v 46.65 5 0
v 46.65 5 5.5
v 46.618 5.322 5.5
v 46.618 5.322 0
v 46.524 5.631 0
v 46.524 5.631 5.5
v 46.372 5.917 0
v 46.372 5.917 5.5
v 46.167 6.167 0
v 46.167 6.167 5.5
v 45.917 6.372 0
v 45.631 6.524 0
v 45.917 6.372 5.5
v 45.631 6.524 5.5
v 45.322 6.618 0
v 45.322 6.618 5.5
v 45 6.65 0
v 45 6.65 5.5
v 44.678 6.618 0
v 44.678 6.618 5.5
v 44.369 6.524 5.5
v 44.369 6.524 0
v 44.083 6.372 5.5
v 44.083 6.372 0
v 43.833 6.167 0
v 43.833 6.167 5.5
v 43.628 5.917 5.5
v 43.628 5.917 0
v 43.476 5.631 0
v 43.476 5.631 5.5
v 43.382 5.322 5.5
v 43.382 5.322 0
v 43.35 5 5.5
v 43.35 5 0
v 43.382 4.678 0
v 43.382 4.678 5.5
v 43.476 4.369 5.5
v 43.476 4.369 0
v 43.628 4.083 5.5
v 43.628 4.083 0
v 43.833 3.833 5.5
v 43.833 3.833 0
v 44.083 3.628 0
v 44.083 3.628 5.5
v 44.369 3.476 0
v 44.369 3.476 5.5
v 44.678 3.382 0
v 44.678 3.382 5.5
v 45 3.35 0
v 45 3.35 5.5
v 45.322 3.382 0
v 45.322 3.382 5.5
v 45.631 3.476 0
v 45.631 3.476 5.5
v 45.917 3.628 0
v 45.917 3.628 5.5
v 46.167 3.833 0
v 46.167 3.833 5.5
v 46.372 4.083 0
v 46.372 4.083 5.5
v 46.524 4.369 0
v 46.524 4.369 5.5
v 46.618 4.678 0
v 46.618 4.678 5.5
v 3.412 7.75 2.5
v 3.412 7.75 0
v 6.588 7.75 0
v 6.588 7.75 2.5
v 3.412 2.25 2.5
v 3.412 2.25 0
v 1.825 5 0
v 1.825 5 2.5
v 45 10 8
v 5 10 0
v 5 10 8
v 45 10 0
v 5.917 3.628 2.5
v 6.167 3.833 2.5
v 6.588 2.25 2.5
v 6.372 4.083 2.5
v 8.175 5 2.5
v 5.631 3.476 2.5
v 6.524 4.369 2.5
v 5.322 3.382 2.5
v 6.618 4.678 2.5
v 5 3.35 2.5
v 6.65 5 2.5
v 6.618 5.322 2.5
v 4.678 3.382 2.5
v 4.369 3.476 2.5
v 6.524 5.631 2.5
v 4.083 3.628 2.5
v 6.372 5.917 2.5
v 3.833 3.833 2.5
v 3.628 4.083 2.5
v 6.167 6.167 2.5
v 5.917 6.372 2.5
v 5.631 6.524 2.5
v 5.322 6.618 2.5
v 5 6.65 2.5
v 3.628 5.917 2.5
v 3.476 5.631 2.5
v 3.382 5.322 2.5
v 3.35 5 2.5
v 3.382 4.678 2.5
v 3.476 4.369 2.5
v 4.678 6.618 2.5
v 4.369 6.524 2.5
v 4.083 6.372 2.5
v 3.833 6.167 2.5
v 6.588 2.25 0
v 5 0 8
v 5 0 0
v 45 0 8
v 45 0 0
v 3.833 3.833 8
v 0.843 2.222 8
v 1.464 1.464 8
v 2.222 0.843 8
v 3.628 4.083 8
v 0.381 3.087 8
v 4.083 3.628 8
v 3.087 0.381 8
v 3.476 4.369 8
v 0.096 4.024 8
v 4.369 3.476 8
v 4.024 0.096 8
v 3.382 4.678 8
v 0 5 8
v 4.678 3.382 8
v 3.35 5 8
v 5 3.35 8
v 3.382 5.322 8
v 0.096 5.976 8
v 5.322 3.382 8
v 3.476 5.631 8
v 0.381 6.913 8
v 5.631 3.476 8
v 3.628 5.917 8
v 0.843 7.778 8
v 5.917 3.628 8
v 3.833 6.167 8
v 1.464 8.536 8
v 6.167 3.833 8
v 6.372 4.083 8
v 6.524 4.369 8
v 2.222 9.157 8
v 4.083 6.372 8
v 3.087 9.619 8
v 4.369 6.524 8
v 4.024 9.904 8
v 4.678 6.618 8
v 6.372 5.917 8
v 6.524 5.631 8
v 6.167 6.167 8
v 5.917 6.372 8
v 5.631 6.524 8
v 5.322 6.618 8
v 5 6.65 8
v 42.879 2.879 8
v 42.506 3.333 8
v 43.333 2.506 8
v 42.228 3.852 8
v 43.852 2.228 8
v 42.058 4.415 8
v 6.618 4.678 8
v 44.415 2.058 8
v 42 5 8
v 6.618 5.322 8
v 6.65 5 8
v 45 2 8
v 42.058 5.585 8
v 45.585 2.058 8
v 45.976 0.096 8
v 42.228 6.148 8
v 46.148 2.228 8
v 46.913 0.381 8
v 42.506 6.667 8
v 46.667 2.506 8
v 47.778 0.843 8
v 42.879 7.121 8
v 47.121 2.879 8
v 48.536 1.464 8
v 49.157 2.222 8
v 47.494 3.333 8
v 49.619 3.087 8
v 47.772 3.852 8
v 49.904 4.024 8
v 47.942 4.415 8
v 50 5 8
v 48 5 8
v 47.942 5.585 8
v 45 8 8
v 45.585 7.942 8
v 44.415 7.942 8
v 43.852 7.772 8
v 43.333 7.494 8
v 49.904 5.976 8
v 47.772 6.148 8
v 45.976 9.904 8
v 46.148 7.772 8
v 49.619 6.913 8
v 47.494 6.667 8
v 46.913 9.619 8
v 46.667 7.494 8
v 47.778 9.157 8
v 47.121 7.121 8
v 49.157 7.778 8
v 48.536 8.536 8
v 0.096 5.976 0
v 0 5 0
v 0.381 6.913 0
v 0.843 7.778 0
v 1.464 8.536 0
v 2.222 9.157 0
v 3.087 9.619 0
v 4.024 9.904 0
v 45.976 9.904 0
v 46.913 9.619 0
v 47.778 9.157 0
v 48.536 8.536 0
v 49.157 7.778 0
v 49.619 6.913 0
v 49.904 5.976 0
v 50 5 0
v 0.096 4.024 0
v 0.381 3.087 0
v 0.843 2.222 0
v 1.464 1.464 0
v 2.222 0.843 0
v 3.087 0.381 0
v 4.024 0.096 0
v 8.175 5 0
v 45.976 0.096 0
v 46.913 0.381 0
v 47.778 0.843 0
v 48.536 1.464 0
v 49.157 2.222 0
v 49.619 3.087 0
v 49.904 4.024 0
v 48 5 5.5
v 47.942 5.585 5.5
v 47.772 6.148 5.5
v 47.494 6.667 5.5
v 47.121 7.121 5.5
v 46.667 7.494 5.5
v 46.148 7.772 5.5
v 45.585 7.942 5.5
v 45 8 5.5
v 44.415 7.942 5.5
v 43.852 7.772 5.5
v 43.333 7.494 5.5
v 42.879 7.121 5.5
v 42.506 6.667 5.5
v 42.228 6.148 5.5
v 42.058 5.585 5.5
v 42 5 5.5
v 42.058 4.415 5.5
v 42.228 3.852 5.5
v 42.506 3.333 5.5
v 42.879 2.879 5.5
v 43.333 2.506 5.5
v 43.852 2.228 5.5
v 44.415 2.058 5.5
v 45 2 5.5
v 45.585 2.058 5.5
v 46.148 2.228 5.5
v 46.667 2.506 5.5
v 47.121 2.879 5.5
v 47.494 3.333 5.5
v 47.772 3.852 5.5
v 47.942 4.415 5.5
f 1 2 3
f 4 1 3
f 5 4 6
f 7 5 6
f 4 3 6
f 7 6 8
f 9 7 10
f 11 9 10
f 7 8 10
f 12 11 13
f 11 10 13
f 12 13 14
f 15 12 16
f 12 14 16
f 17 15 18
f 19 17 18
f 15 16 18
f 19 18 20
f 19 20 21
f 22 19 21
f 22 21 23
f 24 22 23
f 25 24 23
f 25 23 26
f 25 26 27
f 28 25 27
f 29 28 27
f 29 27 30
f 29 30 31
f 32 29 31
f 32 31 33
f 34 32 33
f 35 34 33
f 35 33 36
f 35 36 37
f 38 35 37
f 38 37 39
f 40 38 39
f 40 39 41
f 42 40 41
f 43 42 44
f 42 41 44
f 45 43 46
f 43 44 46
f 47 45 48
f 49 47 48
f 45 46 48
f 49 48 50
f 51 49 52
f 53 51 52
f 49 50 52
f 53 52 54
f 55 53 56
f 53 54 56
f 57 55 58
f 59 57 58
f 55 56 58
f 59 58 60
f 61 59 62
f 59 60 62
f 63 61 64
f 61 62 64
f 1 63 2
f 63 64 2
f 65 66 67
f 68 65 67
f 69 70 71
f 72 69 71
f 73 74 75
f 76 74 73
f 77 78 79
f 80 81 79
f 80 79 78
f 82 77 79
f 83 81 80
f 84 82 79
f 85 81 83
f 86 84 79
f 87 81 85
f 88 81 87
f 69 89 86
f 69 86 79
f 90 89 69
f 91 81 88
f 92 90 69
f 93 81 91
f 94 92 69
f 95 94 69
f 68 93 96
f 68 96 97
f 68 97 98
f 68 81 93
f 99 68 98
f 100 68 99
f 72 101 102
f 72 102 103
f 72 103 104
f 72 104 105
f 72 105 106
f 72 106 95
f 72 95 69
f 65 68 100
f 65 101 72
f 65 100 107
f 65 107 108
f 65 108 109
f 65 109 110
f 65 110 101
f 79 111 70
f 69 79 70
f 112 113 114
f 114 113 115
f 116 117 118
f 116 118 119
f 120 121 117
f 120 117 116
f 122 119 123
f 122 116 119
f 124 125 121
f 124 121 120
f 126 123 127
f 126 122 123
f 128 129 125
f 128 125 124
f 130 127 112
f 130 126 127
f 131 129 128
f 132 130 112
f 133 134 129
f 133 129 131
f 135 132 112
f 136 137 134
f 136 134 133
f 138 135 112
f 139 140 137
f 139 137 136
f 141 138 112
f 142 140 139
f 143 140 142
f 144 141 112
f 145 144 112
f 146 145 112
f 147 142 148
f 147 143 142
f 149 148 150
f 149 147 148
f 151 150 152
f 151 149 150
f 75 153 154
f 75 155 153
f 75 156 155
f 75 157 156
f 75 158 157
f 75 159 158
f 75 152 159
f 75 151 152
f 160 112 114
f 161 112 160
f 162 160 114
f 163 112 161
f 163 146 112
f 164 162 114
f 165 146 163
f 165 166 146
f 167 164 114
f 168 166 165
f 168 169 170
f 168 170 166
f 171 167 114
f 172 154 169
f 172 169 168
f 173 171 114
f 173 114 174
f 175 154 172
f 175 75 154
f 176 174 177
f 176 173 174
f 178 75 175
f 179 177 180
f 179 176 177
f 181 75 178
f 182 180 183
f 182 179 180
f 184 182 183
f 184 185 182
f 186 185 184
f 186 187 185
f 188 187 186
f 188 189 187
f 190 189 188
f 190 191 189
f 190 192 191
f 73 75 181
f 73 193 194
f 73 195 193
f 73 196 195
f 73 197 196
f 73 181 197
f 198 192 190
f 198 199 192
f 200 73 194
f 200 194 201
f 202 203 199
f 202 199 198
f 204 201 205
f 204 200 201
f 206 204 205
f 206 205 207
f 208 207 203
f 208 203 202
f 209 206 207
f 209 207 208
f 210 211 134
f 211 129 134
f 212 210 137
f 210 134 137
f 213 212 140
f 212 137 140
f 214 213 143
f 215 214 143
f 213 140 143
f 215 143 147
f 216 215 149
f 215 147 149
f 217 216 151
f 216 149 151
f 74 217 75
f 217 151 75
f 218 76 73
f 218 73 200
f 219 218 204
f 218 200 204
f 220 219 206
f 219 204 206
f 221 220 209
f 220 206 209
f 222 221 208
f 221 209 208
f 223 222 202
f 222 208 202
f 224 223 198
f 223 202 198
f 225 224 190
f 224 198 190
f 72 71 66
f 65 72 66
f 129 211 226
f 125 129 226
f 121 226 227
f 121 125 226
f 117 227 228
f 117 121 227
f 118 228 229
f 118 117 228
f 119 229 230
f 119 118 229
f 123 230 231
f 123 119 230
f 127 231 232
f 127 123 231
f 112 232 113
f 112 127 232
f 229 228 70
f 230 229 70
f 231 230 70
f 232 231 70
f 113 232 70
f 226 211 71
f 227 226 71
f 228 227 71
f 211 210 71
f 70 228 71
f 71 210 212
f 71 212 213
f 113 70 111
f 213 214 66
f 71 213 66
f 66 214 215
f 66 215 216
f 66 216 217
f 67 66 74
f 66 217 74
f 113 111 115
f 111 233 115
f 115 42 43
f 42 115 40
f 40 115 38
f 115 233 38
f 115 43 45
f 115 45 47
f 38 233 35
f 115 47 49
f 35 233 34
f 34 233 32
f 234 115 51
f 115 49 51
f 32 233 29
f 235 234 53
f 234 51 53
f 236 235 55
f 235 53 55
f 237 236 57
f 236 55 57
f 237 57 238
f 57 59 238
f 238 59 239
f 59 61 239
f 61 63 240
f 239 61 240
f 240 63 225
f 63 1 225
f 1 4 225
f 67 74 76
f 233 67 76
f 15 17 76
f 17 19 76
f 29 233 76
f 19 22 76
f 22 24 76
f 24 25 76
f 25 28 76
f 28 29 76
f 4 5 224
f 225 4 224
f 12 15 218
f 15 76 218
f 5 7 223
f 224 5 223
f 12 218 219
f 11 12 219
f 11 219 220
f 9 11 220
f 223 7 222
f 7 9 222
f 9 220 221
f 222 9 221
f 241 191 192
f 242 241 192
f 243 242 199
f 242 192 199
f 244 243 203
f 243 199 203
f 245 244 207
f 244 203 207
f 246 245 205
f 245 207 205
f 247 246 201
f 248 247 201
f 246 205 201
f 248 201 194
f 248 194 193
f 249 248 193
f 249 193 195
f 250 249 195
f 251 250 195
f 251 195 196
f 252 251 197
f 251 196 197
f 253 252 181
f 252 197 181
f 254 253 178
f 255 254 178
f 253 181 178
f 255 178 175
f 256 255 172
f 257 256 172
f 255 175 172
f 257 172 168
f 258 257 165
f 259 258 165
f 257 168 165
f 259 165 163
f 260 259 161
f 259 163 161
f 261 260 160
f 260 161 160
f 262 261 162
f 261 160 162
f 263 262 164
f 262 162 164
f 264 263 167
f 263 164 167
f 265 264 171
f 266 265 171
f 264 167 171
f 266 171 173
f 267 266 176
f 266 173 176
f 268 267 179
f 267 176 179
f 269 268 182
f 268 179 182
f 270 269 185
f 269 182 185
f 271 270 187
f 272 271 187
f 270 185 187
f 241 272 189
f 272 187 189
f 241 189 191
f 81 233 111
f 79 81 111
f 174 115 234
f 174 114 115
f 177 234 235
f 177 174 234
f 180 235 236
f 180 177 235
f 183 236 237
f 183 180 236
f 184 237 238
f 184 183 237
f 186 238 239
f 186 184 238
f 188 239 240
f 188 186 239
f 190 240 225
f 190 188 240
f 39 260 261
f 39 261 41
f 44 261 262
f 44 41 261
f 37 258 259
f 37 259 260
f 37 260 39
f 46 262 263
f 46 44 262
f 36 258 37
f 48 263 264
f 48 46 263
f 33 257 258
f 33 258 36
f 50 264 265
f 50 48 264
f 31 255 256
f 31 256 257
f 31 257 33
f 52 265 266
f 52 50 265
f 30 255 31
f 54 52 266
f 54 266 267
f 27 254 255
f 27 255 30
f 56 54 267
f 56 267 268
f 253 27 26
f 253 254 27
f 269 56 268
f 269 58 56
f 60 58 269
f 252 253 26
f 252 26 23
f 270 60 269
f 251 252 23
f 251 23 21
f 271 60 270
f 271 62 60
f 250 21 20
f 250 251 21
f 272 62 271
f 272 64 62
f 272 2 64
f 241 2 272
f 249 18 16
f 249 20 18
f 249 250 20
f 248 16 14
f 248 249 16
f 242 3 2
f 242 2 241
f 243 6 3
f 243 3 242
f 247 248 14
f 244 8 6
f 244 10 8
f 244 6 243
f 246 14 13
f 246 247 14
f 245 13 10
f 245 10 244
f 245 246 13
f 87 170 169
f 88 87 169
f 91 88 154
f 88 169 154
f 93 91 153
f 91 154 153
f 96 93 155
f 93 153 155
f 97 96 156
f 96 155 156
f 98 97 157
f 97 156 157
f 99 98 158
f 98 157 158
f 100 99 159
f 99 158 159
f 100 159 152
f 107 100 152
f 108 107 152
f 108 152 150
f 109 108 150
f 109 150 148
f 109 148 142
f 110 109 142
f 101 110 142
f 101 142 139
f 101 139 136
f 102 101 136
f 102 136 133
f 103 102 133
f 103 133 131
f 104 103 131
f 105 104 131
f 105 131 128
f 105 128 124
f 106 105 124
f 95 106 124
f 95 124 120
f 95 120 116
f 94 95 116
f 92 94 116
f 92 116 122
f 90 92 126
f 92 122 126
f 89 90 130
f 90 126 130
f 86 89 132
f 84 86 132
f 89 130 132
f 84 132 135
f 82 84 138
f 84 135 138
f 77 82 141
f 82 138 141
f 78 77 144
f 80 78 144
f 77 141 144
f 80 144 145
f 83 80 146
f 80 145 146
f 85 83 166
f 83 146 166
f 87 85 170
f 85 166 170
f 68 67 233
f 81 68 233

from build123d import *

# Parameters (mm, degrees)
SKICA1_W                 = 50
SKICA1_H                 = 10
P_IDAT_VYSUNUT_M1_DEPTH  = 8
SKICA2_R                 = 1.65
ODEBRAT_VYSUNUT_M1_DEPTH = 52.613951602
ZAOBLIT2_R               = 5
SKICA3_R                 = 3
ODEBRAT_VYSUNUT_M2_DEPTH = 2.5
ODEBRAT_VYSUNUT_M3_DEPTH = 2.5


with BuildPart() as part:
    # Skica1 → Přidat vysunutím1 (new body)
    with BuildSketch(Plane.XY):
        with Locations((25, 5)):
            Rectangle(SKICA1_W, SKICA1_H)
    extrude(amount=P_IDAT_VYSUNUT_M1_DEPTH)

    # Skica2 → Odebrat vysunutím1 (cut, through all)
    with BuildSketch(Plane.XY.offset(8)):
        with Locations((5, 5)):
            Circle(SKICA2_R)
        with Locations((45, 5)):
            Circle(SKICA2_R)
    extrude(amount=-ODEBRAT_VYSUNUT_M1_DEPTH, mode=Mode.SUBTRACT)

    # Zaoblit2
    zaoblit2_edges = [part.edges().sort_by_distance(p)[0] for p in [
        (50, 0, 4),
        (50, 10, 4),
        (0, 0, 4),
        (0, 10, 4),
    ]]
    fillet(zaoblit2_edges, radius=ZAOBLIT2_R - 0.0001)  # a hair under: the kernel refuses the full size

    # Skica3 → Odebrat vysunutím2 (cut)
    with BuildSketch(Plane.XY.offset(8)):
        with Locations((45, 5)):
            Circle(SKICA3_R)
    extrude(amount=-ODEBRAT_VYSUNUT_M2_DEPTH, mode=Mode.SUBTRACT)

    # Skica4 → Odebrat vysunutím3 (cut)
    with BuildSketch(Plane(origin=(0, 0, 0), x_dir=(-1, 0, 0), z_dir=(0, 0, -1))):
        Polygon((-6.58771324, 7.75), (-8.175426481, 5), (-6.58771324, 2.25), (-3.41228676, 2.25), (-1.824573519, 5), (-3.41228676, 7.75), align=None)
    extrude(amount=-ODEBRAT_VYSUNUT_M3_DEPTH, mode=Mode.SUBTRACT)


solid = part.part
